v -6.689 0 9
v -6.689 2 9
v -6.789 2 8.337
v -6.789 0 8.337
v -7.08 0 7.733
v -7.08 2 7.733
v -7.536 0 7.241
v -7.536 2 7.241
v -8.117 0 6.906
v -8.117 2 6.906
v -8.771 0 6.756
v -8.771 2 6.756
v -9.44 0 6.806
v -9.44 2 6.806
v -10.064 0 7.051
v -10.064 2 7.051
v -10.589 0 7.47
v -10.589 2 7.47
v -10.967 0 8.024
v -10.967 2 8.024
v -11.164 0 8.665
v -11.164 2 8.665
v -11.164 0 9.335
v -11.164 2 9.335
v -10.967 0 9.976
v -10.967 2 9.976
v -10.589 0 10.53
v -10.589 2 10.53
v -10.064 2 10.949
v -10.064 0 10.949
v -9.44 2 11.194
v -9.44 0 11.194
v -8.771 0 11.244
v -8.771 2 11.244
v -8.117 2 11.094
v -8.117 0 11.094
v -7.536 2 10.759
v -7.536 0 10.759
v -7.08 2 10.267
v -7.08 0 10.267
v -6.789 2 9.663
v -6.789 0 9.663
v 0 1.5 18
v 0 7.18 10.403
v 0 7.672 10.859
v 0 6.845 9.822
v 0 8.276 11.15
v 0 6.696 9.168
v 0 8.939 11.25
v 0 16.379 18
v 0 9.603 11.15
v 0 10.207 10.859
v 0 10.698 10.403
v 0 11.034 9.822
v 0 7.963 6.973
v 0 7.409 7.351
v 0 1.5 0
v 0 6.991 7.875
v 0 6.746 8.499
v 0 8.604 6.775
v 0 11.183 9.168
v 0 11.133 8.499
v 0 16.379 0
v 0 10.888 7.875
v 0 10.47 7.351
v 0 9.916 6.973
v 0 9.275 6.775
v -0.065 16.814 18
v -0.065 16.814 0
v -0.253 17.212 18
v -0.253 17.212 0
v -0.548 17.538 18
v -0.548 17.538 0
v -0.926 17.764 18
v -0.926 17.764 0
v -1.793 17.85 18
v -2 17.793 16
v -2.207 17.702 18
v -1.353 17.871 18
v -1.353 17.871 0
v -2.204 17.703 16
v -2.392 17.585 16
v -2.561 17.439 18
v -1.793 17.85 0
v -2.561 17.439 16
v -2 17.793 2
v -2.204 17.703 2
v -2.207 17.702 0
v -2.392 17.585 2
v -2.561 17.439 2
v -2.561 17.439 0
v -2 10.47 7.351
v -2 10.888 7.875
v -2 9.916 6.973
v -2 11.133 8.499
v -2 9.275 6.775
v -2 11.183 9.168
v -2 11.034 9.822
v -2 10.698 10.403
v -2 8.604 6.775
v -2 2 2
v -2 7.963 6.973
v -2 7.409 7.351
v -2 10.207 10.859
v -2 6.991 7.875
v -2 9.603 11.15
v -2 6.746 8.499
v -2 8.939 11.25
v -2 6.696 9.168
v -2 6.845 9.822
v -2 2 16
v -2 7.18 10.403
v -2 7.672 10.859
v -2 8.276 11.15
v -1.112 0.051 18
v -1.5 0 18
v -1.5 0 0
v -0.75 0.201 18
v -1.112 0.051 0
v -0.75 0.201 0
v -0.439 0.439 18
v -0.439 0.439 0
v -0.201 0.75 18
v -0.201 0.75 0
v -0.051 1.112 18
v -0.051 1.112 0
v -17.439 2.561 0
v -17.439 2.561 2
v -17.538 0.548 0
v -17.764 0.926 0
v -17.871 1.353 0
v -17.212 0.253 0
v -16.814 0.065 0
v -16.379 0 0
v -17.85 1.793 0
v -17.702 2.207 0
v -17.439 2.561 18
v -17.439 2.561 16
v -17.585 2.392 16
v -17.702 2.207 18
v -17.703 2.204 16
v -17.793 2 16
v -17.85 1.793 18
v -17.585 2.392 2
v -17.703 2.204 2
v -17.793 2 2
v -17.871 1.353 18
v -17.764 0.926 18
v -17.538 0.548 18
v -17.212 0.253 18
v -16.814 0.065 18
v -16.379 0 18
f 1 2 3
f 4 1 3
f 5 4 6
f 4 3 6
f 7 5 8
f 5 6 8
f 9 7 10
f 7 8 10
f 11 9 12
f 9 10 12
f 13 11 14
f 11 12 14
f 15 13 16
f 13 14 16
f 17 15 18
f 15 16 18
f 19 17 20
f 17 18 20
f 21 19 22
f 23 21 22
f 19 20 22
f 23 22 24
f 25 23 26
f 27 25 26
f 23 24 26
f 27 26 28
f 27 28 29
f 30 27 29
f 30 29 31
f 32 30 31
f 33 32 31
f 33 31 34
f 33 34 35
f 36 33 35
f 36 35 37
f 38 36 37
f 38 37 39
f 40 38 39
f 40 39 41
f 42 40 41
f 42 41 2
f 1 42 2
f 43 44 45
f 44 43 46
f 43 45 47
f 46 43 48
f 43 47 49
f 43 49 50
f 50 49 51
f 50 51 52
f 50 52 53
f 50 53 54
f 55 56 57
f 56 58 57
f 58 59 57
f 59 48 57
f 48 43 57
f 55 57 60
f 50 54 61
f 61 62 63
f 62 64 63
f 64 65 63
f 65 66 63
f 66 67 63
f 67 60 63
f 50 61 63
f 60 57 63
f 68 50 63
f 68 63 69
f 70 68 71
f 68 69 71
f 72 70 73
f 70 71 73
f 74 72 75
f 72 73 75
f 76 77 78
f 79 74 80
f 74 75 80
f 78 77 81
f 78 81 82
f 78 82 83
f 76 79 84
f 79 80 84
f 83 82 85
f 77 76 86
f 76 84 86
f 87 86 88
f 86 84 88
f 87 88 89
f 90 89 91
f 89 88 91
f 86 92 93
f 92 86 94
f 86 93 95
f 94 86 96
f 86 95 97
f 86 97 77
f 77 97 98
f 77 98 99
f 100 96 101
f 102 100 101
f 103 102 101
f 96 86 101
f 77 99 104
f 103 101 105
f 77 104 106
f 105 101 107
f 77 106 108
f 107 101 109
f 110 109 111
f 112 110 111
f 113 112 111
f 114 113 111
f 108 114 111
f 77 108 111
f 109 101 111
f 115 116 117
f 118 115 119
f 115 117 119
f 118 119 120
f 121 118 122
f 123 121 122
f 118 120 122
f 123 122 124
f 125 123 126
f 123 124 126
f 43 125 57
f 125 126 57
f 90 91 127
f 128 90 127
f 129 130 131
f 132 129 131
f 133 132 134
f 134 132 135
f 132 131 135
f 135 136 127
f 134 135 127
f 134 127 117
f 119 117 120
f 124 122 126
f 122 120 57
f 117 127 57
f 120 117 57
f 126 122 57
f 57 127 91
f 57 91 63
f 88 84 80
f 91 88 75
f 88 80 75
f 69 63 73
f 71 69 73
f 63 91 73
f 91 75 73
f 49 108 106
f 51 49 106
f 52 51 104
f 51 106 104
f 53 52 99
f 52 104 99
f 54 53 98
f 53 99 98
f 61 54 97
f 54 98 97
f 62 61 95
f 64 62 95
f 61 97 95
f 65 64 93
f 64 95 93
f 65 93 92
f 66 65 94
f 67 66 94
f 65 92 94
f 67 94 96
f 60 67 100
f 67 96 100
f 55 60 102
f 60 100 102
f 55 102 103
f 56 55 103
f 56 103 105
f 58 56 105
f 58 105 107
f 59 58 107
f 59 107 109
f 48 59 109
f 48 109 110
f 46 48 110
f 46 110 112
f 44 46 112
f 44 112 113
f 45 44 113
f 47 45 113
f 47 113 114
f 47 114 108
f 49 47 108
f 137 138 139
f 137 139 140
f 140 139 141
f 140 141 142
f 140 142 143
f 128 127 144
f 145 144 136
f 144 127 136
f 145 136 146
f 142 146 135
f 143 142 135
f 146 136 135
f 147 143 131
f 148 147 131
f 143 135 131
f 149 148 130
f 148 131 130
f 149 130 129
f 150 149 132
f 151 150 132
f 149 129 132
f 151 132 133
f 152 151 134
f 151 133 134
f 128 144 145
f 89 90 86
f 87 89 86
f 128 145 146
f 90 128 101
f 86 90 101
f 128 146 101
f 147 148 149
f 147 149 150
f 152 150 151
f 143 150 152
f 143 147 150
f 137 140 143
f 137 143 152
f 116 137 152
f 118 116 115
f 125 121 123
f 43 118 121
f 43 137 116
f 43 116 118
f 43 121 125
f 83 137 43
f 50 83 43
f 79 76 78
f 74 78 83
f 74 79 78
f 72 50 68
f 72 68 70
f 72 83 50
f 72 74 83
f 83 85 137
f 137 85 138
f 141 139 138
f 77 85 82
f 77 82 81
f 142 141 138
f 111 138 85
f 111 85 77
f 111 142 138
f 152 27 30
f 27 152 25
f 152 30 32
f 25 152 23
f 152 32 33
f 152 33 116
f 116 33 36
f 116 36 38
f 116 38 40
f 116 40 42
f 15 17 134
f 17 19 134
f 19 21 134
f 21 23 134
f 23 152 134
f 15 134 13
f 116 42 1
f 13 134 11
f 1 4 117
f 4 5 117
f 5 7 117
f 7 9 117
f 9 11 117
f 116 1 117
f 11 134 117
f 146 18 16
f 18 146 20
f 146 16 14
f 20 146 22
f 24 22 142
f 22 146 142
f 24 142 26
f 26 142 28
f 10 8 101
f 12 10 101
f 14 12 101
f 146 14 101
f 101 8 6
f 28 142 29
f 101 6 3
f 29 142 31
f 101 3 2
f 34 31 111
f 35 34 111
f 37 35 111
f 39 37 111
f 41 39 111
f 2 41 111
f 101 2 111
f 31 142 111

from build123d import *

# Parameters (mm, degrees)
BOSS_EXTRU_1_DEPTH      = 18
ENL_V_START             = -2
ESQUISSE2_W             = 17.221313325
ESQUISSE2_H             = 14
ENL_V_MAT_EXTRU_1_DEPTH = 30.036983947
D_GAGEMENT_M41_D        = 4.5
D_GAGEMENT_M42_D        = 4.5


with BuildPart() as part:
    # Esquisse1 → Boss.-Extru.1 (new body)
    with BuildSketch(Plane.XY):
        with BuildLine():
            Line((0, 1.5), (0, 16.378679656))
            ThreePointArc((0, 16.378679656), (-0.925974851, 17.764498955), (-2.560660172, 17.439339828))
            Line((-2.560660172, 17.439339828), (-17.439339828, 2.560660172))
            ThreePointArc((-17.439339828, 2.560660172), (-17.764498955, 0.925974851), (-16.378679656, 0))
            Line((-16.378679656, 0), (-1.5, 0))
            ThreePointArc((-1.5, 0), (-0.439339828, 0.439339828), (0, 1.5))
        make_face()
    extrude(amount=BOSS_EXTRU_1_DEPTH)

    # Esquisse2 → Enlèv. mat.-Extru.1 (cut, through all)
    with BuildSketch(Plane.XZ.offset(ENL_V_START)):
        with Locations((-10.610656663, 9)):
            Rectangle(ESQUISSE2_W, ESQUISSE2_H)
    extrude(amount=-ENL_V_MAT_EXTRU_1_DEPTH, mode=Mode.SUBTRACT)

    # Dégagement M41 (through all)
    with Locations(Plane(origin=(0, 0, 0), x_dir=(0, 0, -1), z_dir=(1, 0, 0))):
        with Locations((-9, 8.939339828)):
            Hole(D_GAGEMENT_M41_D / 2)

    # Dégagement M42 (through all)
    with Locations(Plane(origin=(0, 0, 0), x_dir=(-1, 0, 0), z_dir=(0, -1, 0))):
        with Locations((8.939339828, -9)):
            Hole(D_GAGEMENT_M42_D / 2)


solid = part.part
